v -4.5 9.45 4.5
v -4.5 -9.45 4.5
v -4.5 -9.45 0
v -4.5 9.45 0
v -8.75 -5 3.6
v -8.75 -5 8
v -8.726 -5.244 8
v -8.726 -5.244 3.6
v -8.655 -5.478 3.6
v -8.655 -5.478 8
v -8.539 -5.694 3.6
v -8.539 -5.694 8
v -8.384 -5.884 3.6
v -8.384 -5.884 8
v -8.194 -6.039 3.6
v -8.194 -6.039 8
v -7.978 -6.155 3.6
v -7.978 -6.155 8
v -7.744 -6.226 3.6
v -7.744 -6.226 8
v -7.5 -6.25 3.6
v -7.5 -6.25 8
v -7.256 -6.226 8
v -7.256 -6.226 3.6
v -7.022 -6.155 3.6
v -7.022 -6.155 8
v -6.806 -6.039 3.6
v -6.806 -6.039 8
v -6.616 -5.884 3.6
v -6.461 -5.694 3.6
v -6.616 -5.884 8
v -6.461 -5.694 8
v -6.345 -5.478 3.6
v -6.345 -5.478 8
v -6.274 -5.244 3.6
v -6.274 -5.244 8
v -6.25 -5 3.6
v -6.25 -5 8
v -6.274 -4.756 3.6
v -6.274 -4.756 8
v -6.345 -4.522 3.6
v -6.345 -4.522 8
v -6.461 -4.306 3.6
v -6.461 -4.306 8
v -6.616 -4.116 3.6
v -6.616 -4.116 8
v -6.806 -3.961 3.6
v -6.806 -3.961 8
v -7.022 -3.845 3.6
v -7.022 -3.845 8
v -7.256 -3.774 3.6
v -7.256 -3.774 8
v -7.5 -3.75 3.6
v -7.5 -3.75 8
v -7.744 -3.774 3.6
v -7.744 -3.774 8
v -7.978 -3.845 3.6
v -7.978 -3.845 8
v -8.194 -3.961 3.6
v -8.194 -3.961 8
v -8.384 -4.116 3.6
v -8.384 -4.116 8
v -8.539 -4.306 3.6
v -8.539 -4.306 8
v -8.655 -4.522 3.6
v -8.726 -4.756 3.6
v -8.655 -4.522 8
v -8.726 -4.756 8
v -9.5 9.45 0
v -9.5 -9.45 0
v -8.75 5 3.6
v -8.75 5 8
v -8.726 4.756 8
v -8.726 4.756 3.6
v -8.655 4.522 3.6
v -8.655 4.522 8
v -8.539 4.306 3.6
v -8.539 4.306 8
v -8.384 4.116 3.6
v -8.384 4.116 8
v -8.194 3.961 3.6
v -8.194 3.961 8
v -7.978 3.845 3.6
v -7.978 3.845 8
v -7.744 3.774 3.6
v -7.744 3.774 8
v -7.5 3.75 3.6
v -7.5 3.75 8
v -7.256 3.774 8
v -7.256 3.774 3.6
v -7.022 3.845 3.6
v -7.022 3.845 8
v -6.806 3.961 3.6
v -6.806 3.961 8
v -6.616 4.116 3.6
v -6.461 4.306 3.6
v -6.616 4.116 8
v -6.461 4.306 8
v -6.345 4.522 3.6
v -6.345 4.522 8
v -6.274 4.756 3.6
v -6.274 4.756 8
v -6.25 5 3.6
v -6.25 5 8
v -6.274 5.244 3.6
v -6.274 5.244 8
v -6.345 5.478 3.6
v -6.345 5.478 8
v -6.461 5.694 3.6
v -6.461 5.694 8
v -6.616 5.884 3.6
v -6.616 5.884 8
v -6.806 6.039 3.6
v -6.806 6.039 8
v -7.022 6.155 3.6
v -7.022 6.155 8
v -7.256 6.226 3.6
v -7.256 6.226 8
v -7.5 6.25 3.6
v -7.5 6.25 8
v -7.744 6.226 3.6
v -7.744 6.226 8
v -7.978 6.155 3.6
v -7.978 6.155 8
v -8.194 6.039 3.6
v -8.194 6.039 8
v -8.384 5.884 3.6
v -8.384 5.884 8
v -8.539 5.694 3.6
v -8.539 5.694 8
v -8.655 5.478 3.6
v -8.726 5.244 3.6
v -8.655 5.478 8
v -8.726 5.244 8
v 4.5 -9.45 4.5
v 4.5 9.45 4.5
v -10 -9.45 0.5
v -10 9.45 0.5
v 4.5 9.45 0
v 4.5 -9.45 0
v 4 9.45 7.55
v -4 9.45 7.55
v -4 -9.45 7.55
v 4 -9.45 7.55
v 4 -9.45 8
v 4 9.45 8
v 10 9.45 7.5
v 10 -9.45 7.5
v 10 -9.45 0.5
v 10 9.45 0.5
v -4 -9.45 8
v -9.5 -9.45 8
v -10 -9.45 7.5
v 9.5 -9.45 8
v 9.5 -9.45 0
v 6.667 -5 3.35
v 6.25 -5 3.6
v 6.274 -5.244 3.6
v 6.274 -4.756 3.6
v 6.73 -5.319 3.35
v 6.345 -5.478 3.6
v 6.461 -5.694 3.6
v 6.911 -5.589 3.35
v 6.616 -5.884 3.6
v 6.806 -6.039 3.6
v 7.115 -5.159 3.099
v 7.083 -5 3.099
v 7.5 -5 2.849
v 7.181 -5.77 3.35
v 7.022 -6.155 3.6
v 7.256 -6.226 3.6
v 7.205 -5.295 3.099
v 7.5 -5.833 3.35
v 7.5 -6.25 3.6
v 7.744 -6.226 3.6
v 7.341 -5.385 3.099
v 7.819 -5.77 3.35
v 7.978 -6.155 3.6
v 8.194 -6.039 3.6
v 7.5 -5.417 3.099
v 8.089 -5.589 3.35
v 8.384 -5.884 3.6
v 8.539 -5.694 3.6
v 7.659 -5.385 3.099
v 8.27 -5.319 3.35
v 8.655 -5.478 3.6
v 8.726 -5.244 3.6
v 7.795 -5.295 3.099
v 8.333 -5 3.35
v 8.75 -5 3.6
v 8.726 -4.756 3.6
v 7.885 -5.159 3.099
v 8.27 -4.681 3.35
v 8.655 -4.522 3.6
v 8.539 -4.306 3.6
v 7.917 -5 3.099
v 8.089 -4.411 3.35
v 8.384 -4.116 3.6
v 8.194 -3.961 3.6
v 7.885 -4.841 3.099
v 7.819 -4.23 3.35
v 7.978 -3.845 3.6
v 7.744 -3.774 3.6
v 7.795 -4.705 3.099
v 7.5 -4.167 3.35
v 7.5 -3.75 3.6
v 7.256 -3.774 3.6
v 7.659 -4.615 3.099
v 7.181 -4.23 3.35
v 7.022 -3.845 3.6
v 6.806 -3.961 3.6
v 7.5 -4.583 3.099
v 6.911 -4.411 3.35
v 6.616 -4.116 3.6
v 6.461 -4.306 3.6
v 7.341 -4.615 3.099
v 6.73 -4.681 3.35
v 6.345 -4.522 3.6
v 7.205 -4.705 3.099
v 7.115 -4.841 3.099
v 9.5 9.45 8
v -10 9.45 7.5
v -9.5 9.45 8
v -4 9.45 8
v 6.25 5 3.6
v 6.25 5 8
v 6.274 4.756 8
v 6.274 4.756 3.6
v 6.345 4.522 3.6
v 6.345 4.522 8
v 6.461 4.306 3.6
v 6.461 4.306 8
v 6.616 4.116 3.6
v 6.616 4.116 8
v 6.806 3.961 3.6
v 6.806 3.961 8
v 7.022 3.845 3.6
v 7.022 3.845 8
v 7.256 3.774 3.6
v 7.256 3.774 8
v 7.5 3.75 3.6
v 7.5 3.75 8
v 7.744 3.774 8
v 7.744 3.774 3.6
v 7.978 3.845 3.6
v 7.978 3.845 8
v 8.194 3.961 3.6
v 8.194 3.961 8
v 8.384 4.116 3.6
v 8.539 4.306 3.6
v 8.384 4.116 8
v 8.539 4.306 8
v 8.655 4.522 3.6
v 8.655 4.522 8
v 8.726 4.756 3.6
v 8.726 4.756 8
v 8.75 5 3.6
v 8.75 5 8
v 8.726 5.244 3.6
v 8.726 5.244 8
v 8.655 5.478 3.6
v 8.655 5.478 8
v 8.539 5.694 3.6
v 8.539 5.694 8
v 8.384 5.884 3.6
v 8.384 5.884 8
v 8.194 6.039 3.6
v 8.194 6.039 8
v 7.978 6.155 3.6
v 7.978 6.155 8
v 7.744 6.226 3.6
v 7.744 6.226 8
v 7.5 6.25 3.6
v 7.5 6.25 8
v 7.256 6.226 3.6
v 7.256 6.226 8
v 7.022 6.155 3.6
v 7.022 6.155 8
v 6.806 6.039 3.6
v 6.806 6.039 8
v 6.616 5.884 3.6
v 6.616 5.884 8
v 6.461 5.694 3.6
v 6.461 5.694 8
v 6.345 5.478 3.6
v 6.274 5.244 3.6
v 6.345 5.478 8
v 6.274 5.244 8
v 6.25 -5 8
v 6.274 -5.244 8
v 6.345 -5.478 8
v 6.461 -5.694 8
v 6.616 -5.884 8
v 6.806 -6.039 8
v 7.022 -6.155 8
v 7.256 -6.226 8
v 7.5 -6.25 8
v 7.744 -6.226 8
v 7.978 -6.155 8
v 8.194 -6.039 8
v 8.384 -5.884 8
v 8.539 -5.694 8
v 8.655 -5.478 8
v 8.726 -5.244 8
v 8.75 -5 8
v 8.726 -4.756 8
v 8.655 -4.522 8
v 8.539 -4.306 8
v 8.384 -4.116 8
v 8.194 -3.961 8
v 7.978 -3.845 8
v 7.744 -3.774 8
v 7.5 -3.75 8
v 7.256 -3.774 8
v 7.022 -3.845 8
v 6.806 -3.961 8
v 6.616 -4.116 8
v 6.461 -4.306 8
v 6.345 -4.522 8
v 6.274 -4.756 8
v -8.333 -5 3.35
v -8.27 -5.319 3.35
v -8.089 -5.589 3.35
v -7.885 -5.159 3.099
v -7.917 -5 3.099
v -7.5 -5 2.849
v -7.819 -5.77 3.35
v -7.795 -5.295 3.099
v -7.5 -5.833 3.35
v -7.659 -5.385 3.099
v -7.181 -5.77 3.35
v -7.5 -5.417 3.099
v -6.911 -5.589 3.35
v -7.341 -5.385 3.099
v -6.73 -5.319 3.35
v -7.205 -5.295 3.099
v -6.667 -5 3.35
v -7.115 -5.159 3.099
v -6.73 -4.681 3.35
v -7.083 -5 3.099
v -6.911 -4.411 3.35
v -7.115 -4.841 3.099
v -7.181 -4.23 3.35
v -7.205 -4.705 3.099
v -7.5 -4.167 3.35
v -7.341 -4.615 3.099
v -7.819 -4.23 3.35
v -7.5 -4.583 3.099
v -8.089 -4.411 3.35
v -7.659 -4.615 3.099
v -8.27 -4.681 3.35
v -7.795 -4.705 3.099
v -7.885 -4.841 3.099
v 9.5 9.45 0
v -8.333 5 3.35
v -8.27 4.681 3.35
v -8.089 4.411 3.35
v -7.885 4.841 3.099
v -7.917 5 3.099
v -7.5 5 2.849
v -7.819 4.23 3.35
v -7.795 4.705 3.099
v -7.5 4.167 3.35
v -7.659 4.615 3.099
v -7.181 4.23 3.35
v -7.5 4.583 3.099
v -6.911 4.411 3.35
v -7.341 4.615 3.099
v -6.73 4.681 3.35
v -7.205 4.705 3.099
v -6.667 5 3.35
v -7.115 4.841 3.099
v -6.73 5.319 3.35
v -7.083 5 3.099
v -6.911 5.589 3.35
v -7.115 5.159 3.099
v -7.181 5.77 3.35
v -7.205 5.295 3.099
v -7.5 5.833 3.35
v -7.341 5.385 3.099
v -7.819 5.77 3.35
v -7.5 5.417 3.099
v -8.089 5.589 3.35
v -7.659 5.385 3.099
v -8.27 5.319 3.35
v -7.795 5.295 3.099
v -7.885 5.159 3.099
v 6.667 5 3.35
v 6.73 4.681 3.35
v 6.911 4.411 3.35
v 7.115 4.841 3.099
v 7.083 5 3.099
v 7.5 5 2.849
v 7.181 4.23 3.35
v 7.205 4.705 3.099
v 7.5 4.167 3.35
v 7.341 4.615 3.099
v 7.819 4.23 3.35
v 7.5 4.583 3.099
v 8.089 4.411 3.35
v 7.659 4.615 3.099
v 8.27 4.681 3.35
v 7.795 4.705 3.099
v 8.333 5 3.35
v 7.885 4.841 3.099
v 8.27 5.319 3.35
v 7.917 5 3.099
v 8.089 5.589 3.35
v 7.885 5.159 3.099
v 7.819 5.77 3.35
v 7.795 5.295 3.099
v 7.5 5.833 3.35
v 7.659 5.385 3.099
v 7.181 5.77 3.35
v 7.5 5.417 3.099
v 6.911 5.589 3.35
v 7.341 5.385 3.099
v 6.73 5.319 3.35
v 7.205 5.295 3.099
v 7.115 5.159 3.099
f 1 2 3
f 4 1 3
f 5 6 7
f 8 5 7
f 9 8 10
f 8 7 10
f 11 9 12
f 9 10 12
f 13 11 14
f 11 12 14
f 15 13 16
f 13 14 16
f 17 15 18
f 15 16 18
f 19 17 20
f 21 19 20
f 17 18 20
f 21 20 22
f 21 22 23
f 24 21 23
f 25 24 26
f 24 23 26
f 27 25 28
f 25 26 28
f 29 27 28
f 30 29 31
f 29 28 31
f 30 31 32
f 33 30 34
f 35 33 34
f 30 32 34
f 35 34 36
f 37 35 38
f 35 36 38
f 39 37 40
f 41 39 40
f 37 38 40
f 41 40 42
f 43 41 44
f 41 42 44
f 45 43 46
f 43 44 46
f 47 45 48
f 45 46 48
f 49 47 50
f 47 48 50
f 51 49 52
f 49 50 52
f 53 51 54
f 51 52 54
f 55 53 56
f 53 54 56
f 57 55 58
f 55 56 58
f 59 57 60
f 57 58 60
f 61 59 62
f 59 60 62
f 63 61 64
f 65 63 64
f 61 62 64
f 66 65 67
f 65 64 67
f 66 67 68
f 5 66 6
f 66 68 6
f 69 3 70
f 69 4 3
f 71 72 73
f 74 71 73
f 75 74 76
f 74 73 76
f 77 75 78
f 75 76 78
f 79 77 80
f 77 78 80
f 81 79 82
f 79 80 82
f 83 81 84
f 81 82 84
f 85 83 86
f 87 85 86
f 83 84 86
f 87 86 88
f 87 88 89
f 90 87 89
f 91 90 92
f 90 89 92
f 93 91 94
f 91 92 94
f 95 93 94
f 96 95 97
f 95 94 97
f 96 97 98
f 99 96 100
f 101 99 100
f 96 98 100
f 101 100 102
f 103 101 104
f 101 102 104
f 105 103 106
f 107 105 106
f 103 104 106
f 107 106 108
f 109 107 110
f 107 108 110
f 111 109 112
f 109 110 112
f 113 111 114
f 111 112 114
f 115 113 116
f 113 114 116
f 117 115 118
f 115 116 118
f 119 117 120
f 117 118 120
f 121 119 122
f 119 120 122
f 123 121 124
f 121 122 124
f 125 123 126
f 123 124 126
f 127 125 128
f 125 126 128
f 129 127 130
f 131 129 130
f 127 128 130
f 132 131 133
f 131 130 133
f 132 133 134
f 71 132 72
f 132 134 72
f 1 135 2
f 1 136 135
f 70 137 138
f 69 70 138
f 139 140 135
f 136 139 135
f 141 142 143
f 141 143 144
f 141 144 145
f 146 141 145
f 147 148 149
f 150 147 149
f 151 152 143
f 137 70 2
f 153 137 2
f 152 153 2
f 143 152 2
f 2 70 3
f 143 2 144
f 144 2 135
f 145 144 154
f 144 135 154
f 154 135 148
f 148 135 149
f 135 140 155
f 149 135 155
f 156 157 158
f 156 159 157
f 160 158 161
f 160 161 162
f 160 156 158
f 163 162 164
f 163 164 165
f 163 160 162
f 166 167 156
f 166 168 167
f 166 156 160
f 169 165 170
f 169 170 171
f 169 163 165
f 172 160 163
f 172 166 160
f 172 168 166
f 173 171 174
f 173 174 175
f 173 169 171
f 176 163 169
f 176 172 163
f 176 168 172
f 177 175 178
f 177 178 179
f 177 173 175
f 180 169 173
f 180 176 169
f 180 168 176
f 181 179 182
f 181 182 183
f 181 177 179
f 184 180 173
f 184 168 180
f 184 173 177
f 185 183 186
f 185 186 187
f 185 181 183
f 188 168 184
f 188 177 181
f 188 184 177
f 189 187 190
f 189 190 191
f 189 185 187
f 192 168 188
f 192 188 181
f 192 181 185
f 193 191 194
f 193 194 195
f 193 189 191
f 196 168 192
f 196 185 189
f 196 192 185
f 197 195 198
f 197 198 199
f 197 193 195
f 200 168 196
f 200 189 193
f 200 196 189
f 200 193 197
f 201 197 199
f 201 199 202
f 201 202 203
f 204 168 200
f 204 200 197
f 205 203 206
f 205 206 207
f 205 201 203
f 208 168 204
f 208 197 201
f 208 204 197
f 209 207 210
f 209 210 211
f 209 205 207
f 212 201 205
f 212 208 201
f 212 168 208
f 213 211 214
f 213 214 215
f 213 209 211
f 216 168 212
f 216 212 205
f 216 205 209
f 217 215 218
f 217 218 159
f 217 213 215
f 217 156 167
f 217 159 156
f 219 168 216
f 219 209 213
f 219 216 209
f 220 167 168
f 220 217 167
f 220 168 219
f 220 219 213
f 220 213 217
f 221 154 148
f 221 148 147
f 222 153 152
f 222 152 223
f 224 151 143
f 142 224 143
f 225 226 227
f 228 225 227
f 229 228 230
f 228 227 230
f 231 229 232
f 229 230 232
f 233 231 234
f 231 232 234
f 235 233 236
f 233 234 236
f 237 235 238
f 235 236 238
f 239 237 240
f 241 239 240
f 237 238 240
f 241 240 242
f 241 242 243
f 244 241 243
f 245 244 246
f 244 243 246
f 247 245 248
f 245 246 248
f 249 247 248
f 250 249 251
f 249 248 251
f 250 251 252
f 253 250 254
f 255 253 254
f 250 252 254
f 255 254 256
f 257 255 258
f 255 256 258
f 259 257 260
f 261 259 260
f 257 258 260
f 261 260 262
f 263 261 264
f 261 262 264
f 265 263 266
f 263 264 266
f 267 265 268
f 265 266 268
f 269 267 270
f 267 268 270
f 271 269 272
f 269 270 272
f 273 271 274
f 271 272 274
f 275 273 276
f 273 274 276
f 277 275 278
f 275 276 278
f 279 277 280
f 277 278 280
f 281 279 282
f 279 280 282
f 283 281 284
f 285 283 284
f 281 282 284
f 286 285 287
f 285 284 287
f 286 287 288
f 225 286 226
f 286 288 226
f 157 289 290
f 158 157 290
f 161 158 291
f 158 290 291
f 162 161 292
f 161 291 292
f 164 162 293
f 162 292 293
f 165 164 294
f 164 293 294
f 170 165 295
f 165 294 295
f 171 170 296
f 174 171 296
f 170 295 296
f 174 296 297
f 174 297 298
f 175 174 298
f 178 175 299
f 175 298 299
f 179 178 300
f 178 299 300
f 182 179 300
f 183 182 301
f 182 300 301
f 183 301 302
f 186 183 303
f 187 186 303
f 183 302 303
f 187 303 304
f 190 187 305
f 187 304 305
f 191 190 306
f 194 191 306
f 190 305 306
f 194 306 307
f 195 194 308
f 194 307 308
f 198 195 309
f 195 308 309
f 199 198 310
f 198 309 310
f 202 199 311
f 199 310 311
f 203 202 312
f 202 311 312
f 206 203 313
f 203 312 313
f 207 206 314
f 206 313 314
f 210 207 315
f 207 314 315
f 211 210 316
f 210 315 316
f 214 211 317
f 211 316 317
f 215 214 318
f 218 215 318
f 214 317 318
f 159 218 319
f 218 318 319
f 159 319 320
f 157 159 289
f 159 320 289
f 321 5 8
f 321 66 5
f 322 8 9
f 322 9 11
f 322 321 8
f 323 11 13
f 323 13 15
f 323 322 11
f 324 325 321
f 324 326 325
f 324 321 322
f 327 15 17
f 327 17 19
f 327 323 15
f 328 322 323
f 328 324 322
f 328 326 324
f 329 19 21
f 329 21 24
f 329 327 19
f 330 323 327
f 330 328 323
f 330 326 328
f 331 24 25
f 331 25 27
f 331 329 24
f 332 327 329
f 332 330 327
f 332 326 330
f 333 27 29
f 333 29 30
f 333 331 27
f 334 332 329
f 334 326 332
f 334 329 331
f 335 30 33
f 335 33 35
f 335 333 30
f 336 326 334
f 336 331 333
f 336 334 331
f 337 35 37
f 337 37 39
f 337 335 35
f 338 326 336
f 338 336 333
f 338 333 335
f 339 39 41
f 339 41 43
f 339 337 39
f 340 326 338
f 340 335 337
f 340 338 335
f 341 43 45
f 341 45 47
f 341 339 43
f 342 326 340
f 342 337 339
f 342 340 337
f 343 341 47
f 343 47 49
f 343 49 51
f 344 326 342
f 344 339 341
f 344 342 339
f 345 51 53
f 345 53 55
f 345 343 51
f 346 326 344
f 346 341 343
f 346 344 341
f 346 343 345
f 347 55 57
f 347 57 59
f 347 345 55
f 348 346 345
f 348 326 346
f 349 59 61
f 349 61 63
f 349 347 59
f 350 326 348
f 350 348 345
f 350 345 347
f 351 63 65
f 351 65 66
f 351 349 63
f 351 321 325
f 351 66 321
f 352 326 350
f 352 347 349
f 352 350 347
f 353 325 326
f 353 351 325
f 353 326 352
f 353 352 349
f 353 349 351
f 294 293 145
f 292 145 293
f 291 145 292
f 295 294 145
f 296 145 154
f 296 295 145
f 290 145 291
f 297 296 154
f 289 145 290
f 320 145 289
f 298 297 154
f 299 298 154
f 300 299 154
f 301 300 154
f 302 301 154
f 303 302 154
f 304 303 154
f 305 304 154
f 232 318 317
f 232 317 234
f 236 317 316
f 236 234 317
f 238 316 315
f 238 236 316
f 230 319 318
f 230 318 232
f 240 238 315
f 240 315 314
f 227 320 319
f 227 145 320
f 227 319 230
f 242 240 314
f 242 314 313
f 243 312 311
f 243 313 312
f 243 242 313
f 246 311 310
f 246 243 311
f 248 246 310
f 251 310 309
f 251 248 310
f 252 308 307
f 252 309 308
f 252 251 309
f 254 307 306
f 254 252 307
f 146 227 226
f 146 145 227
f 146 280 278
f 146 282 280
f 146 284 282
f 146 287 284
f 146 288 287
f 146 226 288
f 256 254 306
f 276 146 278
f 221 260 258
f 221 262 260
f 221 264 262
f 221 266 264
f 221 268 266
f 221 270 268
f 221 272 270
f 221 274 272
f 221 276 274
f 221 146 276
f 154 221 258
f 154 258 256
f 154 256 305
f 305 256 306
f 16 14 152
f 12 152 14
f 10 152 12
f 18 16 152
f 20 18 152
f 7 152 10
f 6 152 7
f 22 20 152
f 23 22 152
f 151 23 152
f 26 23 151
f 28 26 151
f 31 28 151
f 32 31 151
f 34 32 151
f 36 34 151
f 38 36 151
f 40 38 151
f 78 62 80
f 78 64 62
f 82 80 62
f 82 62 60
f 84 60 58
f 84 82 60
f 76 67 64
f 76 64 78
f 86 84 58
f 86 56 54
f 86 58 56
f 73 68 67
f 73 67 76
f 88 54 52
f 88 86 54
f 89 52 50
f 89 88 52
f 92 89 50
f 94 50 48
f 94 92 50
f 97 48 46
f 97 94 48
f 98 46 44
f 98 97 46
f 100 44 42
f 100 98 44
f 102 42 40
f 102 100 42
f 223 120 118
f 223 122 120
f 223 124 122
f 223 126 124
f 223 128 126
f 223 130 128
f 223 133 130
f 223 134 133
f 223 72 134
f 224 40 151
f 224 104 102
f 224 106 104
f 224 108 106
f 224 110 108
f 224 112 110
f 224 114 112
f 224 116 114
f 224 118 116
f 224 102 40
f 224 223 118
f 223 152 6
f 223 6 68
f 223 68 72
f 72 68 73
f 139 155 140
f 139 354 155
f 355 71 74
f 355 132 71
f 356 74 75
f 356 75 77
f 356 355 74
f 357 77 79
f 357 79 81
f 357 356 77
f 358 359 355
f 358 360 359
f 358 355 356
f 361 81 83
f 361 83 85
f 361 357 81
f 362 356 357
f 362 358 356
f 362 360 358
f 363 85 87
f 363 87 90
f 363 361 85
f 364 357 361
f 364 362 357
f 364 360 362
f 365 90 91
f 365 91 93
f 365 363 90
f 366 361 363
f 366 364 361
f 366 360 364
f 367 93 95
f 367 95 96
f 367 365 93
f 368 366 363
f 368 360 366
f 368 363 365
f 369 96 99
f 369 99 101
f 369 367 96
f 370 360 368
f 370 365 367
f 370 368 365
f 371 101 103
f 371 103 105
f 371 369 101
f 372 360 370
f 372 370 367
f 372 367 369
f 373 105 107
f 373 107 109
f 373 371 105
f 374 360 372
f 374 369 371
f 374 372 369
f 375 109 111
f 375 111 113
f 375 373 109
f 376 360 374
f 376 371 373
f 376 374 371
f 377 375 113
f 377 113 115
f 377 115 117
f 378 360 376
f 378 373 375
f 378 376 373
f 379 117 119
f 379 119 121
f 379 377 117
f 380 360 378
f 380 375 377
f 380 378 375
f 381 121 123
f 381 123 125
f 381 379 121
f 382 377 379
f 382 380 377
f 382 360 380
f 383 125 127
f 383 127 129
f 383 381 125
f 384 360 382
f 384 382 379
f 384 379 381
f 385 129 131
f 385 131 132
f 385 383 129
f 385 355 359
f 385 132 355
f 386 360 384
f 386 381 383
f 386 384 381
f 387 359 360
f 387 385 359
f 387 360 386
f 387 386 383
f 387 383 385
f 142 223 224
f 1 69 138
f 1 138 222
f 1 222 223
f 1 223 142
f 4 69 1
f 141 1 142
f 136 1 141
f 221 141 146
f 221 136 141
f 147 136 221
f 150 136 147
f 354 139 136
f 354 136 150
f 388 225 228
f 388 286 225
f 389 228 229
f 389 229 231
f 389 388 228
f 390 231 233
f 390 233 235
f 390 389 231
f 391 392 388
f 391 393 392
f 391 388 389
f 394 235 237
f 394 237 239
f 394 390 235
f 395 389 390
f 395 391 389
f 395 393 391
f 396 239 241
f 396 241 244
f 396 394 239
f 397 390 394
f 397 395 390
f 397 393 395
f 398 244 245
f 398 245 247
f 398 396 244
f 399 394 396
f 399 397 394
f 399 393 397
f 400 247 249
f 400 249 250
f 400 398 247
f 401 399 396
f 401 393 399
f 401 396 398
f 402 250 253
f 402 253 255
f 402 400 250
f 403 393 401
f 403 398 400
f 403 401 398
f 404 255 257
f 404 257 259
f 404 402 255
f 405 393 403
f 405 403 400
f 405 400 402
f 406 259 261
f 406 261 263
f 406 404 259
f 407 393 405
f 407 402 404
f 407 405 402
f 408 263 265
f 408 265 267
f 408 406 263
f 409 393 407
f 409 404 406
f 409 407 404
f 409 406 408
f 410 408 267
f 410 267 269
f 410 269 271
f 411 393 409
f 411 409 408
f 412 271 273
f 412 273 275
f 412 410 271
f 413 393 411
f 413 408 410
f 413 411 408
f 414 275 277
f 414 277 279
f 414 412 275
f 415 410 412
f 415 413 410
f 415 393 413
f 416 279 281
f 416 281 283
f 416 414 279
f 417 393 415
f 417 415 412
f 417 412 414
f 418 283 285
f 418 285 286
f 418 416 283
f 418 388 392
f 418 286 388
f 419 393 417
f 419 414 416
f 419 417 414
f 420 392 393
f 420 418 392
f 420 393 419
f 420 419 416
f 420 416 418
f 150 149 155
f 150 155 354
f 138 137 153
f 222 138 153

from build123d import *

# Parameters (mm, degrees)
PAD001_DEPTH    = 9.45
CHAMFER001_SIZE = 0.5
SKETCH003_R     = 1.25
HOLE_DEPTH      = 4.4
HOLE_TIPS_R     = 1.25


with BuildPart() as part:
    # ShapeBinder → Pad001 (new body, symmetric)
    with BuildSketch(Plane(origin=(0, 0, 4), x_dir=(1, 0, 0), z_dir=(0, 1, 0))):
        Polygon((-4.5, 4), (-10, 4), (-10, -4), (-4, -4), (-4, -3.55), (4, -3.55), (4, -4), (10, -4), (10, 4), (4.5, 4), (4.5, -0.5), (-4.5, -0.5), align=None)
    extrude(amount=PAD001_DEPTH, both=True)

    # Chamfer001
    chamfer001_edges = [part.edges().sort_by_distance(p)[0] for p in [
        (-10, 0, 8),
        (10, 0, 8),
        (10, 0, 0),
        (-10, 0, 0),
    ]]
    chamfer(chamfer001_edges, length=CHAMFER001_SIZE)

    # Sketch003 (on Face18 of Chamfer001) → Hole (cut)
    with BuildSketch(Plane(origin=(0, 0, 8), x_dir=(-1, 0, 0), z_dir=(0, 0, 1))):
        with Locations((-7.5, 5)):
            Circle(SKETCH003_R)
        with Locations((7.5, 5)):
            Circle(SKETCH003_R)
        with Locations((-7.5, -5)):
            Circle(SKETCH003_R)
        with Locations((7.5, -5)):
            Circle(SKETCH003_R)
    extrude(amount=-HOLE_DEPTH, mode=Mode.SUBTRACT)

    # Hole tips → Hole tip 1 section 0
    with BuildSketch(Plane(origin=(0, 0, 3.6), x_dir=(-1, 0, 0), z_dir=(0, 0, 1)), mode=Mode.PRIVATE) as hole_tip_1_s0:
        with Locations((-7.5, 5)):
            Circle(HOLE_TIPS_R)
    loft([hole_tip_1_s0.sketch, Vertex(7.5, -5, 2.848924)], mode=Mode.SUBTRACT)

    # Hole tips → Hole tip 2 section 0
    with BuildSketch(Plane(origin=(0, 0, 3.6), x_dir=(-1, 0, 0), z_dir=(0, 0, 1)), mode=Mode.PRIVATE) as hole_tip_2_s0:
        with Locations((7.5, 5)):
            Circle(HOLE_TIPS_R)
    loft([hole_tip_2_s0.sketch, Vertex(-7.5, -5, 2.848924)], mode=Mode.SUBTRACT)

    # Hole tips → Hole tip 3 section 0
    with BuildSketch(Plane(origin=(0, 0, 3.6), x_dir=(-1, 0, 0), z_dir=(0, 0, 1)), mode=Mode.PRIVATE) as hole_tip_3_s0:
        with Locations((-7.5, -5)):
            Circle(HOLE_TIPS_R)
    loft([hole_tip_3_s0.sketch, Vertex(7.5, 5, 2.848924)], mode=Mode.SUBTRACT)

    # Hole tips → Hole tip 4 section 0
    with BuildSketch(Plane(origin=(0, 0, 3.6), x_dir=(-1, 0, 0), z_dir=(0, 0, 1)), mode=Mode.PRIVATE) as hole_tip_4_s0:
        with Locations((7.5, -5)):
            Circle(HOLE_TIPS_R)
    loft([hole_tip_4_s0.sketch, Vertex(-7.5, 5, 2.848924)], mode=Mode.SUBTRACT)


solid = part.part
